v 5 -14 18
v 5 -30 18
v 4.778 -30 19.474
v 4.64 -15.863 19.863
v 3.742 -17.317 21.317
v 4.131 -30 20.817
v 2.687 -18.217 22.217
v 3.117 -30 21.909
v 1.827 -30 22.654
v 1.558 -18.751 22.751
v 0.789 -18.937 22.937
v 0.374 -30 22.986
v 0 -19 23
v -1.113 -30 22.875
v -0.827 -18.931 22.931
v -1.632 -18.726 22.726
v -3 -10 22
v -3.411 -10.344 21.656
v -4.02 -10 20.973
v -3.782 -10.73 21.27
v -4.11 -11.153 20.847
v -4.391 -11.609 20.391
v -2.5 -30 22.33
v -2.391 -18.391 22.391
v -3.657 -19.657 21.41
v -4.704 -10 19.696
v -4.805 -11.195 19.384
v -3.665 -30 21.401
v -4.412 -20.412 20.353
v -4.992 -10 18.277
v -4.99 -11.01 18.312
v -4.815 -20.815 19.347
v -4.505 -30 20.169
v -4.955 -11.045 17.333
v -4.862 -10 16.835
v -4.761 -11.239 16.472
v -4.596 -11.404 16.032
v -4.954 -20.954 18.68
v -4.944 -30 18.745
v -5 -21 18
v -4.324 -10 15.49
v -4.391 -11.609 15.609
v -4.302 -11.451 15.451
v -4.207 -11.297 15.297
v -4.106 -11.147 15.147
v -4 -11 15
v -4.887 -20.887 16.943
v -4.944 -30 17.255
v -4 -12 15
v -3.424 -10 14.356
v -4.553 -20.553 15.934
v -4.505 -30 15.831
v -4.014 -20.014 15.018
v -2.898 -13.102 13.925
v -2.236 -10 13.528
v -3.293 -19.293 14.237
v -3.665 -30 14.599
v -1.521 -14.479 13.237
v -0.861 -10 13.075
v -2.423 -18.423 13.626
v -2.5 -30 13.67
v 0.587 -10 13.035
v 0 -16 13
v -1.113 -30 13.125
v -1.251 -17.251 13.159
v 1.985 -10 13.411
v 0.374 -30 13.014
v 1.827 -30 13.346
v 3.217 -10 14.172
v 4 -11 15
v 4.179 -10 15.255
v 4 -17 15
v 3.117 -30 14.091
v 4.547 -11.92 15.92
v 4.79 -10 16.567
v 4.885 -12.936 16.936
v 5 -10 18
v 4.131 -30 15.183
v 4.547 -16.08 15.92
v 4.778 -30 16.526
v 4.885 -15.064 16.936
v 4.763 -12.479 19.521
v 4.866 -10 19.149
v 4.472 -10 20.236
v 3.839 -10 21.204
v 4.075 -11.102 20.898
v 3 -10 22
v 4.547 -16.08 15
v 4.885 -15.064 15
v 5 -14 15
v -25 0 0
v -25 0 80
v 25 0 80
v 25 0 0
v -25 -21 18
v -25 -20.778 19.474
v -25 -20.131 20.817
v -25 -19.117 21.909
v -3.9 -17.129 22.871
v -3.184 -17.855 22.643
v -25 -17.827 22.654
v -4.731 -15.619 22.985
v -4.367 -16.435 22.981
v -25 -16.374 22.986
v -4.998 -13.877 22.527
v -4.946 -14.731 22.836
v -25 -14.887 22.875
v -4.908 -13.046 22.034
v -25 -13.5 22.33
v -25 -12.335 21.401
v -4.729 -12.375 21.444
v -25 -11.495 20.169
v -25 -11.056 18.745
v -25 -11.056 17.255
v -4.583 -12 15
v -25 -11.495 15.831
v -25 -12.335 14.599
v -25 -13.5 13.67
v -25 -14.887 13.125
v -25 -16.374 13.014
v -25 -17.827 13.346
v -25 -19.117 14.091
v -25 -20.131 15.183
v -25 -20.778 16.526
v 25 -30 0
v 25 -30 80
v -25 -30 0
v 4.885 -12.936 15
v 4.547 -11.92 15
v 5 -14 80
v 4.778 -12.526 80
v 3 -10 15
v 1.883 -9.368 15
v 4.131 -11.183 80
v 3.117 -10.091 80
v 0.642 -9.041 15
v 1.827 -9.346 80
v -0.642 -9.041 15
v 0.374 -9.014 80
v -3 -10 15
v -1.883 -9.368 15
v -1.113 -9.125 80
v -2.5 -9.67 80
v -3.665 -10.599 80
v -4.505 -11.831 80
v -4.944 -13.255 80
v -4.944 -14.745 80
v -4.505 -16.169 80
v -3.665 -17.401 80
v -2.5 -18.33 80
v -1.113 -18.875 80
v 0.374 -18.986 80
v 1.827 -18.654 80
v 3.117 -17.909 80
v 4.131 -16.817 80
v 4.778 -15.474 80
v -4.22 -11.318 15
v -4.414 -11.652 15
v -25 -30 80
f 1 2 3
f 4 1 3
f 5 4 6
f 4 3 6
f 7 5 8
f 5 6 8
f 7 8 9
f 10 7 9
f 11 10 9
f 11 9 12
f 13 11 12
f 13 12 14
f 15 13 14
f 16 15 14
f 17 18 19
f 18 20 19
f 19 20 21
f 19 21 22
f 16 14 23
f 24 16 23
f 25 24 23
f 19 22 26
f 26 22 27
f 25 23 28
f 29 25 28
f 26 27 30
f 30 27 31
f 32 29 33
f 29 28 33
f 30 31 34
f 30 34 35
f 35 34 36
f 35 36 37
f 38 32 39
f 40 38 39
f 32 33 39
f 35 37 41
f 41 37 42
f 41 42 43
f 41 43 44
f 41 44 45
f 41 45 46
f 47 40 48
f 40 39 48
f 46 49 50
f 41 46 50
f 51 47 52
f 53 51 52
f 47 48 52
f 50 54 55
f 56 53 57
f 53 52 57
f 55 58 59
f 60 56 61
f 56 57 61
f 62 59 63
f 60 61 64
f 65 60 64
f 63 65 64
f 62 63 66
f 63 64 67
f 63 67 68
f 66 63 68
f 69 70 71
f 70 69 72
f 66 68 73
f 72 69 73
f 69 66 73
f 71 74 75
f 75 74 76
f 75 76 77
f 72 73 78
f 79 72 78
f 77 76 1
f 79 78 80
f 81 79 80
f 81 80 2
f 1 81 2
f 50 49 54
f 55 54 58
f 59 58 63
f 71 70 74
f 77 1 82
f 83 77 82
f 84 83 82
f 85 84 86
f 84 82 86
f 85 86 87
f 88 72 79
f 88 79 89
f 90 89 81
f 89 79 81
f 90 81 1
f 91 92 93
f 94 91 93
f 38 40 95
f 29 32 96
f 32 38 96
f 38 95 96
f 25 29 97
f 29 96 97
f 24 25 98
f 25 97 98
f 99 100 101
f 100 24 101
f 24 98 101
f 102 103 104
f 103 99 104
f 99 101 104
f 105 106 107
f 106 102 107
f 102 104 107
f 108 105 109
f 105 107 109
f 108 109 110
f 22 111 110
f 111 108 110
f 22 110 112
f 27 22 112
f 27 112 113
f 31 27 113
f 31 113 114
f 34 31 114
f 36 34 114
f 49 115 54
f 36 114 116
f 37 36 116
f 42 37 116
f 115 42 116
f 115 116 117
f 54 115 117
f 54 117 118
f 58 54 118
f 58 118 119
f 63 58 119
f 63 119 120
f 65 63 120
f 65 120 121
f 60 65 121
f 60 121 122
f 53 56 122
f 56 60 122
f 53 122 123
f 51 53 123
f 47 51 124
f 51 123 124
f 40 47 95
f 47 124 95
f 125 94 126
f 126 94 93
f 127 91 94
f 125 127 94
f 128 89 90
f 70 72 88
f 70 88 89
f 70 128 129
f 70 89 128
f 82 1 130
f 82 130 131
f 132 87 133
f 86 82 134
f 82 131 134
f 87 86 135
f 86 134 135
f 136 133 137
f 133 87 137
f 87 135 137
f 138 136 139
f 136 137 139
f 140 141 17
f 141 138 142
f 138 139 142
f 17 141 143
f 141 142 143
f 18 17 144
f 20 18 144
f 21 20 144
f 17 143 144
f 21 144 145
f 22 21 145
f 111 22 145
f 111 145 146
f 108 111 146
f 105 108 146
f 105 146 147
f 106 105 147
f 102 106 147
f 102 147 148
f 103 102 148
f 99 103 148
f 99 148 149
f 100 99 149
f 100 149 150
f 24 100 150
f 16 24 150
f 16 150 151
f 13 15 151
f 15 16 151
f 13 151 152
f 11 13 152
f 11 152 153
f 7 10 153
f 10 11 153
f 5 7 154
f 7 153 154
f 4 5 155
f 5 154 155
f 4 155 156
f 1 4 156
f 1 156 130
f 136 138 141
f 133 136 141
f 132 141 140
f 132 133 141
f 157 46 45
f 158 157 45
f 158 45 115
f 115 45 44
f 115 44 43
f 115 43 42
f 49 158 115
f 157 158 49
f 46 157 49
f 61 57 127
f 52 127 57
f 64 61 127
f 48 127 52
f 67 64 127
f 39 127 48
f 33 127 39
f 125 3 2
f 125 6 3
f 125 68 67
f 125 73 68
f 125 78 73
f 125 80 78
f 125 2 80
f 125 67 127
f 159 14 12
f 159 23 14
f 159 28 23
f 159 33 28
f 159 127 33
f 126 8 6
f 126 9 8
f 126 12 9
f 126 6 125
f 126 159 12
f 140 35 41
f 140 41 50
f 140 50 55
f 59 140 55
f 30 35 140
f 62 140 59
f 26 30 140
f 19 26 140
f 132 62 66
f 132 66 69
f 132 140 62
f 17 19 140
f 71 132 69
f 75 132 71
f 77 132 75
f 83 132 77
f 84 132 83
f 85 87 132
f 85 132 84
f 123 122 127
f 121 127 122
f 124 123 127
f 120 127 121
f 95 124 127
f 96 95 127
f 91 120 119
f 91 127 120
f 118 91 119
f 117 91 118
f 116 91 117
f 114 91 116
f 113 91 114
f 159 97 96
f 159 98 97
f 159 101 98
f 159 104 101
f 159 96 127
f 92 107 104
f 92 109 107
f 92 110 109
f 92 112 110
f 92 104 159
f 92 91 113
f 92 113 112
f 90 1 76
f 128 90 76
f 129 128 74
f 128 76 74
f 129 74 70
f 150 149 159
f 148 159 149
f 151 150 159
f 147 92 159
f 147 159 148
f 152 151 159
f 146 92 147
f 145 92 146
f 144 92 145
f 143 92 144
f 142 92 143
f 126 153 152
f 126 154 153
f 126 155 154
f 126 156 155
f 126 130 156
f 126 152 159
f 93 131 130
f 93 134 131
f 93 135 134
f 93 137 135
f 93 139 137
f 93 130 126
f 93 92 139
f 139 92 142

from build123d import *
from build123d import SkipClean  # not in build123d's __all__

# Parameters (mm, degrees)
F0_W     = 50
F0_H     = 80
F1_DEPTH = 30
F2_R     = 5
F3_DEPTH = 20
F4_R     = 5
F5_DEPTH = 25
F6_R     = 5
F7_DEPTH = 65


with BuildPart() as f1:
    # F0 (on Front) → F1 (new body)
    with BuildSketch(Plane.XZ):
        with Locations((0, 40)):
            Rectangle(F0_W, F0_H)
    extrude(amount=F1_DEPTH)

    # F2 (on face) → F3 (cut)
    with BuildSketch(Plane.XZ.offset(30)):
        with Locations((0, 18)):
            Circle(F2_R)
    extrude(amount=-F3_DEPTH, mode=Mode.SUBTRACT)

    # F4 (on face) → F5 (cut)
    with BuildSketch(Plane(origin=(-25, 0, 0), x_dir=(0, -1, 0), z_dir=(-1, 0, 0))):
        with Locations((16, 18)):
            Circle(F4_R)
    extrude(amount=-F5_DEPTH, mode=Mode.SUBTRACT)

    # F6 (on face) → F7 (cut)
    with BuildSketch(Plane.XY.offset(80)):
        with Locations((0, -14)):
            Circle(F6_R)
    with SkipClean():  # cleaning this boolean's faces spoils the solid; the shape is the same uncleaned
        extrude(amount=-F7_DEPTH, mode=Mode.SUBTRACT)


solid = f1.part
